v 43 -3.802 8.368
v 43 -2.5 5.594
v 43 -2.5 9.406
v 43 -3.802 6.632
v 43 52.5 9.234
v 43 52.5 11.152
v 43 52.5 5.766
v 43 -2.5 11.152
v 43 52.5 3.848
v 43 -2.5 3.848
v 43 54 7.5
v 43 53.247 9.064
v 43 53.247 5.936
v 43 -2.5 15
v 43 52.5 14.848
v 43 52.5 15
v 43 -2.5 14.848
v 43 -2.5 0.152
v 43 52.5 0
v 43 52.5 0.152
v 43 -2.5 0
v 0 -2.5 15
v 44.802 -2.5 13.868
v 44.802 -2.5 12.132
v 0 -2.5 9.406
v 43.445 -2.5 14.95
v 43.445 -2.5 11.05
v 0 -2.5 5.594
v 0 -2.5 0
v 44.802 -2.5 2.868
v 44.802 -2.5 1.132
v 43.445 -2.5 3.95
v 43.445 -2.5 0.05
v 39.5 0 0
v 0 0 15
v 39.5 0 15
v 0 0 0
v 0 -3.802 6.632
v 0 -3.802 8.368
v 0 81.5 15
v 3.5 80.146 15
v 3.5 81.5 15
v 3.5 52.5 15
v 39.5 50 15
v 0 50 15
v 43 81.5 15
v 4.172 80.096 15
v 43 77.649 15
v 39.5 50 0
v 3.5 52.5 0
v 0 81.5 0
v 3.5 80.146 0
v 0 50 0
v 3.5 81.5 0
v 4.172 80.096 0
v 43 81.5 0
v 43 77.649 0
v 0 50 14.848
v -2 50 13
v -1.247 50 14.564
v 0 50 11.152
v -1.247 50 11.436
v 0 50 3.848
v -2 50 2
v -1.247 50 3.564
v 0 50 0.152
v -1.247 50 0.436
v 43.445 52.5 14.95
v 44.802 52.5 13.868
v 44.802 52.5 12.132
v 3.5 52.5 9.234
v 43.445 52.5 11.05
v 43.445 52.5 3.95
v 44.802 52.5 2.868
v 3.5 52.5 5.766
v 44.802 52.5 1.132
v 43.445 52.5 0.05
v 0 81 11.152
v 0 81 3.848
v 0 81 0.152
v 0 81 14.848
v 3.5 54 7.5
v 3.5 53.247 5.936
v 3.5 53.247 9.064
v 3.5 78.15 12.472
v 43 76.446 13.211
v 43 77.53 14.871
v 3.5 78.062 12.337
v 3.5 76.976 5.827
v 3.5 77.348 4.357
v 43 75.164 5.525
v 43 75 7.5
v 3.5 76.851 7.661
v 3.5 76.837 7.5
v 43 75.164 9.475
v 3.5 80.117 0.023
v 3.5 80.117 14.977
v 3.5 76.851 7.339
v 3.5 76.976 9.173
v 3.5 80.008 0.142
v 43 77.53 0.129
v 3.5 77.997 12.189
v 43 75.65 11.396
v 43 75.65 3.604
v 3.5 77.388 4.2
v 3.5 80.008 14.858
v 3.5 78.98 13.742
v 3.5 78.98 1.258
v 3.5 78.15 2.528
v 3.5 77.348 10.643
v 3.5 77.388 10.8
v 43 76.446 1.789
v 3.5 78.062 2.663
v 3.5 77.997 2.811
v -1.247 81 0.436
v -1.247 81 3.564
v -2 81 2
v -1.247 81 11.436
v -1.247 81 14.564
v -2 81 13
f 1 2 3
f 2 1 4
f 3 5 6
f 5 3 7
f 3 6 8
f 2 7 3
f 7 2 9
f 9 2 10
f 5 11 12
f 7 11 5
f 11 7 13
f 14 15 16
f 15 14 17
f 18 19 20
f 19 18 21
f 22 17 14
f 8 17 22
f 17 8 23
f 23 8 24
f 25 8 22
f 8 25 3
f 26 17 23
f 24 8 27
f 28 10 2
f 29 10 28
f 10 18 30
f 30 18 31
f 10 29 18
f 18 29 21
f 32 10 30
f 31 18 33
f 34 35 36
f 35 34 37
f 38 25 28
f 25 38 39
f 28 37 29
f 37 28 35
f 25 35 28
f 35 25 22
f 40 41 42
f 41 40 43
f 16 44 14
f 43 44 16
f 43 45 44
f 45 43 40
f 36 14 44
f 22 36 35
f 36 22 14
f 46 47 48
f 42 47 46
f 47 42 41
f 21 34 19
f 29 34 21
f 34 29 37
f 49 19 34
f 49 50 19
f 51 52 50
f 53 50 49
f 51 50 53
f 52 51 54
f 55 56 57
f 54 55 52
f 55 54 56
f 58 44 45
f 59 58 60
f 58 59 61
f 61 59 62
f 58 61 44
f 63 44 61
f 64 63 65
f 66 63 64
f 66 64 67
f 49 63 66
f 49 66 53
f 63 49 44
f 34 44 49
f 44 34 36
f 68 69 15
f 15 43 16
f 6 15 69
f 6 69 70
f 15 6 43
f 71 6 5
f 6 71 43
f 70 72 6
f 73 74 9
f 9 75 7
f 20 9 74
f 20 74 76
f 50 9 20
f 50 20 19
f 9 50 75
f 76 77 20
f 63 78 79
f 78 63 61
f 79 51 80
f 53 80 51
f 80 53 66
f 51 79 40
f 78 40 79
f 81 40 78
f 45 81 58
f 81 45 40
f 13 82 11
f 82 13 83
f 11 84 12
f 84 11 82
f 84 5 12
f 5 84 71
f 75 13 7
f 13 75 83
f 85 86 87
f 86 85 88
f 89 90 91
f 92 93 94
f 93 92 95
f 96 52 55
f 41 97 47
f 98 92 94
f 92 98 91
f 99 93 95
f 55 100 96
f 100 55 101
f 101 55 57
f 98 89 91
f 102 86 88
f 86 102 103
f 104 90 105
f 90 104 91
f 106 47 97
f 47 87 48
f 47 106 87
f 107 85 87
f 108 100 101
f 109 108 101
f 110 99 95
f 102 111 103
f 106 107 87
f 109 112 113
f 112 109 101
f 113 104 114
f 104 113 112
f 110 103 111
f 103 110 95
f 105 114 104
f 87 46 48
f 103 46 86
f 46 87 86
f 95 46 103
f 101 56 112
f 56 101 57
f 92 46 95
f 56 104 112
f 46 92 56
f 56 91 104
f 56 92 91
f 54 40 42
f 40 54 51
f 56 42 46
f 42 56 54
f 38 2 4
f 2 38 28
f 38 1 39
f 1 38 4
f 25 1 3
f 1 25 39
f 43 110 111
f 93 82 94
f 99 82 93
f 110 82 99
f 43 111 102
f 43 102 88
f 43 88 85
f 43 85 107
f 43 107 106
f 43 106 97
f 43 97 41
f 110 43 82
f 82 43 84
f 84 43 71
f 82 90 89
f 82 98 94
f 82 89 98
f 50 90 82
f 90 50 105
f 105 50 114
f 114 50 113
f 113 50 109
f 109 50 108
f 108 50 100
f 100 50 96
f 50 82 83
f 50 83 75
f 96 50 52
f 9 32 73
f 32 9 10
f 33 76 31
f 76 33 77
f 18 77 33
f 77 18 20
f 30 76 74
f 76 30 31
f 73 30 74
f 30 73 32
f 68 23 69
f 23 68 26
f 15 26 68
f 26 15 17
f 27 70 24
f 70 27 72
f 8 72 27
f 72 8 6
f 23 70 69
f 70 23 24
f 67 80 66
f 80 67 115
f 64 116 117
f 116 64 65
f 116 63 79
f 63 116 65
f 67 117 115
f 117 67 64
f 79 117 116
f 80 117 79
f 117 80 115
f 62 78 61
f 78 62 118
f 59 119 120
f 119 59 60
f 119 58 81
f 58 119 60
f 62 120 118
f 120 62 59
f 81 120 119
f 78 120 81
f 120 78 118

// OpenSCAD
/* [Global] */

//Shelf or table thicknes
a=50;

//hock height
b=24;

//depth
l=43;

//horizontal thickness
ht=3.5;

//vertical thickness
vt=2.5;

/* [Hidden] */

// width (messing with that beaks things atm)
w=15;

$fa=6;

rotate([90,0,0])
union() {
  union() {
    cube([l,w,vt]);
    translate([l-ht,0,-a]) cube([ht,w,a]);
  }

  translate([0,w/2,+vt-0.5]) rotate([0,90,0]) cylinder(l,2,2);
  
  union(){
    translate([0,0,-a-vt]) cube([l,w,vt]);
    translate([0,w/2,-a-vt+0.5]) rotate([0,90,0]) cylinder(l,2,2);
  }

  translate([0,0,-a-b-7.5]) cube([ht,w,b+7.5]);

  translate([l,2,vt]) rotate([0,180,0]) cylinder(a+2*vt,2,2);
  translate([l,w-2,vt]) rotate([0,180,0]) cylinder(a+2*vt,2,2);

  translate([0,2,-a]) rotate([0,180,0]) cylinder(b+2*vt+2,2,2);
  translate([0,w-2,-a]) rotate([0,180,0]) cylinder(b+2*vt+2,2,2);


  difference() {
    translate([0,7.5,-a-b-vt-vt-8])
    rotate([0,90,0]) cylinder(l,10,12);

    translate([-.5,-5,-a-b-vt-vt-8-12.5]) cube([l+1,25,18]);

    translate([-.5,-5,-a-b-vt-vt-8]) cube([l+1,5,10]);

    translate([-.5,w,-a-b-vt-vt-8]) cube([l+1,5,10]);
  }
}
